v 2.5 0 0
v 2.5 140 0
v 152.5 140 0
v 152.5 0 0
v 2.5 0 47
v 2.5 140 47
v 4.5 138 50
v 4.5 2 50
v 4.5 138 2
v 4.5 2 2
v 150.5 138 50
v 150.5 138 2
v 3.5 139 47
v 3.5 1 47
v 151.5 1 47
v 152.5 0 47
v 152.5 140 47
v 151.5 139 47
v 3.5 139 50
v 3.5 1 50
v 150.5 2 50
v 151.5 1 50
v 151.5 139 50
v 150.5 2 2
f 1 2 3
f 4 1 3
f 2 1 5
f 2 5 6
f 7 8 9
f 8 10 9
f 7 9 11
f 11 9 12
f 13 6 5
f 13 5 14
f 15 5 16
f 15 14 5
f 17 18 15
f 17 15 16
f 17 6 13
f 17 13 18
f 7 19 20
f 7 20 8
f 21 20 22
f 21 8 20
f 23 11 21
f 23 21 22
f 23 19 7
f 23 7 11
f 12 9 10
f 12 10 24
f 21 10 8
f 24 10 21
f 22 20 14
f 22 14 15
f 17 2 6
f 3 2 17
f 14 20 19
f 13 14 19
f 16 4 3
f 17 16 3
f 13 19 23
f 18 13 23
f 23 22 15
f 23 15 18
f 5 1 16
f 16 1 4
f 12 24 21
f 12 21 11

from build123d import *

# Parameters (mm, degrees)
F0_W     = 150
F0_H     = 140
F1_DEPTH = 47
F2_W     = 146
F2_H     = 136
F3_DEPTH = 45
F4_W     = 150
F4_H     = 140
F4_W_2   = 146
F4_H_2   = 136
F5_DEPTH = 3
F6_W     = 150
F6_H     = 140
F6_W_2   = 148
F6_H_2   = 138
F7_DEPTH = 3


with BuildPart() as f1:
    # F0 (on Top) → F1 (new body)
    with BuildSketch(Plane.XY):
        with Locations((77.499742, 70)):
            Rectangle(F0_W, F0_H)
    extrude(amount=F1_DEPTH)

    # F2 (on face) → F3 (cut)
    with BuildSketch(Plane.XY.offset(47)):
        with Locations((77.499742, 70)):
            Rectangle(F2_W, F2_H)
    extrude(amount=-F3_DEPTH, mode=Mode.SUBTRACT)

    # F4 (on face) → F5 (join)
    with BuildSketch(Plane.XY.offset(47)):
        with Locations((77.499742, 70)):
            Rectangle(F4_W, F4_H)
        with Locations((77.499742, 70)):
            Rectangle(F4_W_2, F4_H_2, mode=Mode.SUBTRACT)
    extrude(amount=F5_DEPTH)

    # F6 (on face) → F7 (cut)
    with BuildSketch(Plane.XY.offset(50)):
        with Locations((77.499742, 70)):
            Rectangle(F6_W, F6_H)
        with Locations((77.499742, 70)):
            Rectangle(F6_W_2, F6_H_2, mode=Mode.SUBTRACT)
    extrude(amount=-F7_DEPTH, mode=Mode.SUBTRACT)


solid = f1.part
